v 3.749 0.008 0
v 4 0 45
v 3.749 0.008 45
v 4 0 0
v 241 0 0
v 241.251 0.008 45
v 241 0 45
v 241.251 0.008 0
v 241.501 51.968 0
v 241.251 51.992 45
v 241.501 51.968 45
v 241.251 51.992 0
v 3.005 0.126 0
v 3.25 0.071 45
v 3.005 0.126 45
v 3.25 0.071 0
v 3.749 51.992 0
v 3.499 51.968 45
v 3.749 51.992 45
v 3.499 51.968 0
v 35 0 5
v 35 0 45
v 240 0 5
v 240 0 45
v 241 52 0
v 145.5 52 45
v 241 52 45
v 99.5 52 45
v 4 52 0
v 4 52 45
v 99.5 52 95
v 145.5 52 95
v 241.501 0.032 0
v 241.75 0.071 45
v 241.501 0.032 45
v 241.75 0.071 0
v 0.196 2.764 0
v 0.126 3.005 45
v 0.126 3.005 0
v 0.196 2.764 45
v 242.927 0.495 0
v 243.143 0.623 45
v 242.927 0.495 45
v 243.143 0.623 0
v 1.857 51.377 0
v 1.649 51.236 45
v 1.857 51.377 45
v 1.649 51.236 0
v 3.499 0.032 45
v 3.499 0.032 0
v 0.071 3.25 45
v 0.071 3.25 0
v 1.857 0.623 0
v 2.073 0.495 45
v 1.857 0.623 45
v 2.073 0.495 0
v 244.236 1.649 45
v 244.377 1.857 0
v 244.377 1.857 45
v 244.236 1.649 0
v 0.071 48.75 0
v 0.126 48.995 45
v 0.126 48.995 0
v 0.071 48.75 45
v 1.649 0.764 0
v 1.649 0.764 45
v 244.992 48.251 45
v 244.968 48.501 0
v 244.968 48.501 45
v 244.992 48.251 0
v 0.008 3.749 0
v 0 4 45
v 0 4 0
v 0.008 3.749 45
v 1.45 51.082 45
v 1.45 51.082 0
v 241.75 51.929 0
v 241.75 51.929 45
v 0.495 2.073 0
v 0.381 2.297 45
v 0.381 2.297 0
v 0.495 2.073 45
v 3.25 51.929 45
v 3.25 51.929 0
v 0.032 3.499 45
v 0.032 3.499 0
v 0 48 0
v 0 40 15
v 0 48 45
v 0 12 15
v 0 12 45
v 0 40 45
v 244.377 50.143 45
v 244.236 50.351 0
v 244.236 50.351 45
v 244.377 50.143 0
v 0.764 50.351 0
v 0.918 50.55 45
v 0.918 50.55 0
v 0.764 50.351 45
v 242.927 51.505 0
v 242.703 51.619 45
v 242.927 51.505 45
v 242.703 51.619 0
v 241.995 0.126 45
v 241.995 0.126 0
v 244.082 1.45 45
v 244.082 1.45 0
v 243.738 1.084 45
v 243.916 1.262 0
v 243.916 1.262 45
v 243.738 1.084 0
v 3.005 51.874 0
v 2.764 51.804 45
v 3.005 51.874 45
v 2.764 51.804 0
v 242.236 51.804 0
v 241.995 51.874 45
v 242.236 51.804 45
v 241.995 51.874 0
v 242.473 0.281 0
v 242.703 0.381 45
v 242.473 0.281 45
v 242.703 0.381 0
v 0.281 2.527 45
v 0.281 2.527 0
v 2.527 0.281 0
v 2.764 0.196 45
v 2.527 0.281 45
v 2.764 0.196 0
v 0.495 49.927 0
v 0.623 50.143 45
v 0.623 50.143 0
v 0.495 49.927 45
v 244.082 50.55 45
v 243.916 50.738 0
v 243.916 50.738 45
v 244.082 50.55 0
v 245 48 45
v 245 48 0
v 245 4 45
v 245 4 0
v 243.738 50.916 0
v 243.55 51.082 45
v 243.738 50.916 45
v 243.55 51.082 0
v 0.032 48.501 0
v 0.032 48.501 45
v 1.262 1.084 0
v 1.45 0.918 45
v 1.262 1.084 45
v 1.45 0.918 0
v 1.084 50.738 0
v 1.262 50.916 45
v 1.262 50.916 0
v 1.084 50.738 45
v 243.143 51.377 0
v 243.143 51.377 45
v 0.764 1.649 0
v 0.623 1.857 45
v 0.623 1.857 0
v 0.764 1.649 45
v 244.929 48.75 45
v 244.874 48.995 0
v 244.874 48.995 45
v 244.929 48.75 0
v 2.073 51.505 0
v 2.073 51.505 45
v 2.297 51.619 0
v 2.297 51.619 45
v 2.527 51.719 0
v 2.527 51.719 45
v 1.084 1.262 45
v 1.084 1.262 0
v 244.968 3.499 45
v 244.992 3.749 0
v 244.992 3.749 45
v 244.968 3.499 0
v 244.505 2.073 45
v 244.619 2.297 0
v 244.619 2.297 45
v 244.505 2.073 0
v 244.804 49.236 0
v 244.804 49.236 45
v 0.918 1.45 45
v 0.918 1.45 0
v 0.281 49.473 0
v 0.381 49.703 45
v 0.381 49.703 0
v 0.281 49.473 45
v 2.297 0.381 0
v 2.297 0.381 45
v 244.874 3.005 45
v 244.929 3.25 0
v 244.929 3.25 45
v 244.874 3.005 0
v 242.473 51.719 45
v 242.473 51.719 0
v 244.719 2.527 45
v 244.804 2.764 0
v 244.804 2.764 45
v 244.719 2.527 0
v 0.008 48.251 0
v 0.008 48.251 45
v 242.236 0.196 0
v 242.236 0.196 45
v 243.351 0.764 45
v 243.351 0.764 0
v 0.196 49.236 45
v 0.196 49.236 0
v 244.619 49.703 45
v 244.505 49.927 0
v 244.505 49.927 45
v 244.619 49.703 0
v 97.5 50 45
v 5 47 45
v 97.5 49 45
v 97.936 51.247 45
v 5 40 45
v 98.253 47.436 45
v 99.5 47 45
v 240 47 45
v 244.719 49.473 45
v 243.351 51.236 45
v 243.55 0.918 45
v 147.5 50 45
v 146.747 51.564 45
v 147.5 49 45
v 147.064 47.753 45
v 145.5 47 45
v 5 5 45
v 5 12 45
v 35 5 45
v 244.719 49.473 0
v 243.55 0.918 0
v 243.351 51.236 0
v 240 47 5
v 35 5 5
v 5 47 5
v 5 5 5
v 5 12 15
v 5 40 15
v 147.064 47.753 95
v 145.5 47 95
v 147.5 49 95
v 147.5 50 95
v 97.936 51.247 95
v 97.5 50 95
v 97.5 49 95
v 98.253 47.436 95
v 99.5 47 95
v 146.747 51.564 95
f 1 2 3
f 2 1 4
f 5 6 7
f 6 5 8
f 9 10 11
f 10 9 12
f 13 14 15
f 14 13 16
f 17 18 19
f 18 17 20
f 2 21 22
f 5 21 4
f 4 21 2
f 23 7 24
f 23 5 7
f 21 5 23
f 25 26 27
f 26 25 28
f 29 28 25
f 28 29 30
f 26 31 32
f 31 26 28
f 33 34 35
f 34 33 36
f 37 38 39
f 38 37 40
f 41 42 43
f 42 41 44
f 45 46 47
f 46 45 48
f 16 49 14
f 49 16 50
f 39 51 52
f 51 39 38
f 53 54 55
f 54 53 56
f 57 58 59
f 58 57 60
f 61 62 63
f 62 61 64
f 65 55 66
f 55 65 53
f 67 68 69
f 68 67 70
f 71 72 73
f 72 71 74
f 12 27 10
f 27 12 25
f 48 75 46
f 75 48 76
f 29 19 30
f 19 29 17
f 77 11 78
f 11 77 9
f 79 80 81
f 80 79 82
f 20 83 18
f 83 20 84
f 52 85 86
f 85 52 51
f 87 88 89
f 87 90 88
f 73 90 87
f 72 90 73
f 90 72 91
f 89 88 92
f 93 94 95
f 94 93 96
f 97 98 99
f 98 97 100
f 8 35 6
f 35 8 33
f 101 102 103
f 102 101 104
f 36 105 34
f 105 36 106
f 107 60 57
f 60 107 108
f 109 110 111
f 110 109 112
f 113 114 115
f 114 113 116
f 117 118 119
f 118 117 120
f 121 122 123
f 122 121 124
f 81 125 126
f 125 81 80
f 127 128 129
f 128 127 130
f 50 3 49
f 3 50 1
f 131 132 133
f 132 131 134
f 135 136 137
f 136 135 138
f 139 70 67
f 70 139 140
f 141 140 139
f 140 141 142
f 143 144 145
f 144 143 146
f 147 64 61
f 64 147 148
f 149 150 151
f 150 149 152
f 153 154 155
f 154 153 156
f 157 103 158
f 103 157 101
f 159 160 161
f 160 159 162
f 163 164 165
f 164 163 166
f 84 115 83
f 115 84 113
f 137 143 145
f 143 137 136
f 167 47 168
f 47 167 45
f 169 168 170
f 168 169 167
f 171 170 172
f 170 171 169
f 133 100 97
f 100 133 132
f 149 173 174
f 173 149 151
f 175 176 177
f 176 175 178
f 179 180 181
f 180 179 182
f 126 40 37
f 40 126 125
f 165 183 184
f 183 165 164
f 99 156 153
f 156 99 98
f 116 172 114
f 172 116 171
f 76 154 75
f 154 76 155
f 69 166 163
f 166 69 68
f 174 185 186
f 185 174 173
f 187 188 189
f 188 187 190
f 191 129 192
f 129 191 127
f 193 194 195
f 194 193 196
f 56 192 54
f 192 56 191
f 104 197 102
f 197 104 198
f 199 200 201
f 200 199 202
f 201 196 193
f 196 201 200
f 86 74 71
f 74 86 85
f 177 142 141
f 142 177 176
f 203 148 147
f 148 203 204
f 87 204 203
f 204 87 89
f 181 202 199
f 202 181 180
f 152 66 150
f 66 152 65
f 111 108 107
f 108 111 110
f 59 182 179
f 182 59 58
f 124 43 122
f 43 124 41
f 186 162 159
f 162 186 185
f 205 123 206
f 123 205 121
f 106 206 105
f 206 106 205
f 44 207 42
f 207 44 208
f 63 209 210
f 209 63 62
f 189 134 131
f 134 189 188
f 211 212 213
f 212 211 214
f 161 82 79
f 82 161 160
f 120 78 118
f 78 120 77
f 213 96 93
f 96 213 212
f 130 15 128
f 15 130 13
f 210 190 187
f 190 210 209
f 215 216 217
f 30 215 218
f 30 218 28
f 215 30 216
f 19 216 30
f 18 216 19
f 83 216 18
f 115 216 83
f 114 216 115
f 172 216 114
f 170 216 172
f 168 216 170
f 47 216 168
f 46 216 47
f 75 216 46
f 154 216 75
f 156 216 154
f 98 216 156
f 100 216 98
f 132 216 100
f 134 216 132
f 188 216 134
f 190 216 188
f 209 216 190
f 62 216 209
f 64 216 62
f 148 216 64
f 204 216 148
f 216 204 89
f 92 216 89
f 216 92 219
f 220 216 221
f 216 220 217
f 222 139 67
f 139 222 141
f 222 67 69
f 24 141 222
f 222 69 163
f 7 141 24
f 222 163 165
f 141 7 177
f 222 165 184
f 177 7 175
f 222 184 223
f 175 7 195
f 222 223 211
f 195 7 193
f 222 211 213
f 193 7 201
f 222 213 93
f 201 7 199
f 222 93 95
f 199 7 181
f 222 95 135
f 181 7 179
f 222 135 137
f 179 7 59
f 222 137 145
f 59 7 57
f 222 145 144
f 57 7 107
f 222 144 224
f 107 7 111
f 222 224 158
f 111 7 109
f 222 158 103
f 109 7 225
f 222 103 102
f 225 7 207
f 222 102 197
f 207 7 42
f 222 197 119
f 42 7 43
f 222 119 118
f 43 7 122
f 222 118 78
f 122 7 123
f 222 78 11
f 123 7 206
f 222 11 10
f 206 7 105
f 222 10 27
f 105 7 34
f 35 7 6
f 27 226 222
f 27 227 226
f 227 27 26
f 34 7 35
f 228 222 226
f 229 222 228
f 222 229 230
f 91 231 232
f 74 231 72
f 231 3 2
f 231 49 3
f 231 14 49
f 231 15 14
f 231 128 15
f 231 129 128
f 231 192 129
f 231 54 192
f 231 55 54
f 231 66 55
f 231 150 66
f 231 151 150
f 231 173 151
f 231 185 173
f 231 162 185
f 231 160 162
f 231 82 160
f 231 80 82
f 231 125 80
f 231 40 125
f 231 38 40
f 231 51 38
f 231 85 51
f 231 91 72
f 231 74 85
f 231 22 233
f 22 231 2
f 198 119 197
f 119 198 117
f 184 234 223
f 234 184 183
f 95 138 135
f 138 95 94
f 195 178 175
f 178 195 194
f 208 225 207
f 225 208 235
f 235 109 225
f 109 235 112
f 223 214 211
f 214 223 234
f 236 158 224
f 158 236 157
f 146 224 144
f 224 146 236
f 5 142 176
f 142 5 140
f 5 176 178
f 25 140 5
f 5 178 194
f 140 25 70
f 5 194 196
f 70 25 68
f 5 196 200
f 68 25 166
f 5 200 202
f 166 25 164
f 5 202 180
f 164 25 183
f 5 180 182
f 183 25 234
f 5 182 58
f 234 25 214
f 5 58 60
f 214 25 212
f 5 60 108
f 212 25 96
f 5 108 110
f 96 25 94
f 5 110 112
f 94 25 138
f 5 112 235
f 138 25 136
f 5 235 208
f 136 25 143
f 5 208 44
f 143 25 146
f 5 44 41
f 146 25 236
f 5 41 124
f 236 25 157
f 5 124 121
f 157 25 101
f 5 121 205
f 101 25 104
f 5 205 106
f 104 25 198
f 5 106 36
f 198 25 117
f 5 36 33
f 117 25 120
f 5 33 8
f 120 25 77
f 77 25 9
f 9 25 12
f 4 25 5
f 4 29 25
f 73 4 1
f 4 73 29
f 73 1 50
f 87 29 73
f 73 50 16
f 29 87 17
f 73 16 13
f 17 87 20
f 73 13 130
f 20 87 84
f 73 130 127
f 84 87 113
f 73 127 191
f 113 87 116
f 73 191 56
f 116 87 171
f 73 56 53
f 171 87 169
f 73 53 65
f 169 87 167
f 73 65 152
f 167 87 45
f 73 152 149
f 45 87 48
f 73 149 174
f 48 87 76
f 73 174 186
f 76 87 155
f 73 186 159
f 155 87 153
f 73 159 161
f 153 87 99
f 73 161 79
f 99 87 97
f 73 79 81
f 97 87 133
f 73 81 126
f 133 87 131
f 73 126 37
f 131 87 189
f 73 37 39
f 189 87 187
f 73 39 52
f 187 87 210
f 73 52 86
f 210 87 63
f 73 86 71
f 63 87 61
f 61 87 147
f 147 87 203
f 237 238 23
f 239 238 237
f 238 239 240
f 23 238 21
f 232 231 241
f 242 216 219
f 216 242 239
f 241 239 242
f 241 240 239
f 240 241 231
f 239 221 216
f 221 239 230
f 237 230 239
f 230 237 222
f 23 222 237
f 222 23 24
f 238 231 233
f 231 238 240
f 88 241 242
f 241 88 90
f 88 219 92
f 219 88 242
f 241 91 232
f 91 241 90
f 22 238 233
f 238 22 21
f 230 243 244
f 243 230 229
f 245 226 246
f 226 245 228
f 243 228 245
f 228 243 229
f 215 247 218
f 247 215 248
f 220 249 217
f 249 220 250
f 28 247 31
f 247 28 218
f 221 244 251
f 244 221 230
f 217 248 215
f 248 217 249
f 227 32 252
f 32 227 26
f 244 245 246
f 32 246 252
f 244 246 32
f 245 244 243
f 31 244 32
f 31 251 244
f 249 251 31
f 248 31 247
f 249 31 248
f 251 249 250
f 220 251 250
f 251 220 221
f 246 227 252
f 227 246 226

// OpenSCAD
thick=5;
width=42;
height=40;
length=235;

difference(){
    linear_extrude(height+thick, $fn=100)
        offset(4)offset(-4)
        square([length+thick*2,width+thick*2]);
    translate([thick, thick, thick])
        linear_extrude(height, $fn=100)
            square([length,width]);
    translate([0,(width/2)-(width-7*2)/2+thick,thick+10])
        cube([thick, width-7*2,height]);
    translate([length-200,0,thick])
        cube([200+thick,thick*2,height+thick]);    
}

translate([length/2+thick - 25,width+thick,height+thick])
    linear_extrude(50)
        offset(2)offset(-2)
            square([50,thick]);
